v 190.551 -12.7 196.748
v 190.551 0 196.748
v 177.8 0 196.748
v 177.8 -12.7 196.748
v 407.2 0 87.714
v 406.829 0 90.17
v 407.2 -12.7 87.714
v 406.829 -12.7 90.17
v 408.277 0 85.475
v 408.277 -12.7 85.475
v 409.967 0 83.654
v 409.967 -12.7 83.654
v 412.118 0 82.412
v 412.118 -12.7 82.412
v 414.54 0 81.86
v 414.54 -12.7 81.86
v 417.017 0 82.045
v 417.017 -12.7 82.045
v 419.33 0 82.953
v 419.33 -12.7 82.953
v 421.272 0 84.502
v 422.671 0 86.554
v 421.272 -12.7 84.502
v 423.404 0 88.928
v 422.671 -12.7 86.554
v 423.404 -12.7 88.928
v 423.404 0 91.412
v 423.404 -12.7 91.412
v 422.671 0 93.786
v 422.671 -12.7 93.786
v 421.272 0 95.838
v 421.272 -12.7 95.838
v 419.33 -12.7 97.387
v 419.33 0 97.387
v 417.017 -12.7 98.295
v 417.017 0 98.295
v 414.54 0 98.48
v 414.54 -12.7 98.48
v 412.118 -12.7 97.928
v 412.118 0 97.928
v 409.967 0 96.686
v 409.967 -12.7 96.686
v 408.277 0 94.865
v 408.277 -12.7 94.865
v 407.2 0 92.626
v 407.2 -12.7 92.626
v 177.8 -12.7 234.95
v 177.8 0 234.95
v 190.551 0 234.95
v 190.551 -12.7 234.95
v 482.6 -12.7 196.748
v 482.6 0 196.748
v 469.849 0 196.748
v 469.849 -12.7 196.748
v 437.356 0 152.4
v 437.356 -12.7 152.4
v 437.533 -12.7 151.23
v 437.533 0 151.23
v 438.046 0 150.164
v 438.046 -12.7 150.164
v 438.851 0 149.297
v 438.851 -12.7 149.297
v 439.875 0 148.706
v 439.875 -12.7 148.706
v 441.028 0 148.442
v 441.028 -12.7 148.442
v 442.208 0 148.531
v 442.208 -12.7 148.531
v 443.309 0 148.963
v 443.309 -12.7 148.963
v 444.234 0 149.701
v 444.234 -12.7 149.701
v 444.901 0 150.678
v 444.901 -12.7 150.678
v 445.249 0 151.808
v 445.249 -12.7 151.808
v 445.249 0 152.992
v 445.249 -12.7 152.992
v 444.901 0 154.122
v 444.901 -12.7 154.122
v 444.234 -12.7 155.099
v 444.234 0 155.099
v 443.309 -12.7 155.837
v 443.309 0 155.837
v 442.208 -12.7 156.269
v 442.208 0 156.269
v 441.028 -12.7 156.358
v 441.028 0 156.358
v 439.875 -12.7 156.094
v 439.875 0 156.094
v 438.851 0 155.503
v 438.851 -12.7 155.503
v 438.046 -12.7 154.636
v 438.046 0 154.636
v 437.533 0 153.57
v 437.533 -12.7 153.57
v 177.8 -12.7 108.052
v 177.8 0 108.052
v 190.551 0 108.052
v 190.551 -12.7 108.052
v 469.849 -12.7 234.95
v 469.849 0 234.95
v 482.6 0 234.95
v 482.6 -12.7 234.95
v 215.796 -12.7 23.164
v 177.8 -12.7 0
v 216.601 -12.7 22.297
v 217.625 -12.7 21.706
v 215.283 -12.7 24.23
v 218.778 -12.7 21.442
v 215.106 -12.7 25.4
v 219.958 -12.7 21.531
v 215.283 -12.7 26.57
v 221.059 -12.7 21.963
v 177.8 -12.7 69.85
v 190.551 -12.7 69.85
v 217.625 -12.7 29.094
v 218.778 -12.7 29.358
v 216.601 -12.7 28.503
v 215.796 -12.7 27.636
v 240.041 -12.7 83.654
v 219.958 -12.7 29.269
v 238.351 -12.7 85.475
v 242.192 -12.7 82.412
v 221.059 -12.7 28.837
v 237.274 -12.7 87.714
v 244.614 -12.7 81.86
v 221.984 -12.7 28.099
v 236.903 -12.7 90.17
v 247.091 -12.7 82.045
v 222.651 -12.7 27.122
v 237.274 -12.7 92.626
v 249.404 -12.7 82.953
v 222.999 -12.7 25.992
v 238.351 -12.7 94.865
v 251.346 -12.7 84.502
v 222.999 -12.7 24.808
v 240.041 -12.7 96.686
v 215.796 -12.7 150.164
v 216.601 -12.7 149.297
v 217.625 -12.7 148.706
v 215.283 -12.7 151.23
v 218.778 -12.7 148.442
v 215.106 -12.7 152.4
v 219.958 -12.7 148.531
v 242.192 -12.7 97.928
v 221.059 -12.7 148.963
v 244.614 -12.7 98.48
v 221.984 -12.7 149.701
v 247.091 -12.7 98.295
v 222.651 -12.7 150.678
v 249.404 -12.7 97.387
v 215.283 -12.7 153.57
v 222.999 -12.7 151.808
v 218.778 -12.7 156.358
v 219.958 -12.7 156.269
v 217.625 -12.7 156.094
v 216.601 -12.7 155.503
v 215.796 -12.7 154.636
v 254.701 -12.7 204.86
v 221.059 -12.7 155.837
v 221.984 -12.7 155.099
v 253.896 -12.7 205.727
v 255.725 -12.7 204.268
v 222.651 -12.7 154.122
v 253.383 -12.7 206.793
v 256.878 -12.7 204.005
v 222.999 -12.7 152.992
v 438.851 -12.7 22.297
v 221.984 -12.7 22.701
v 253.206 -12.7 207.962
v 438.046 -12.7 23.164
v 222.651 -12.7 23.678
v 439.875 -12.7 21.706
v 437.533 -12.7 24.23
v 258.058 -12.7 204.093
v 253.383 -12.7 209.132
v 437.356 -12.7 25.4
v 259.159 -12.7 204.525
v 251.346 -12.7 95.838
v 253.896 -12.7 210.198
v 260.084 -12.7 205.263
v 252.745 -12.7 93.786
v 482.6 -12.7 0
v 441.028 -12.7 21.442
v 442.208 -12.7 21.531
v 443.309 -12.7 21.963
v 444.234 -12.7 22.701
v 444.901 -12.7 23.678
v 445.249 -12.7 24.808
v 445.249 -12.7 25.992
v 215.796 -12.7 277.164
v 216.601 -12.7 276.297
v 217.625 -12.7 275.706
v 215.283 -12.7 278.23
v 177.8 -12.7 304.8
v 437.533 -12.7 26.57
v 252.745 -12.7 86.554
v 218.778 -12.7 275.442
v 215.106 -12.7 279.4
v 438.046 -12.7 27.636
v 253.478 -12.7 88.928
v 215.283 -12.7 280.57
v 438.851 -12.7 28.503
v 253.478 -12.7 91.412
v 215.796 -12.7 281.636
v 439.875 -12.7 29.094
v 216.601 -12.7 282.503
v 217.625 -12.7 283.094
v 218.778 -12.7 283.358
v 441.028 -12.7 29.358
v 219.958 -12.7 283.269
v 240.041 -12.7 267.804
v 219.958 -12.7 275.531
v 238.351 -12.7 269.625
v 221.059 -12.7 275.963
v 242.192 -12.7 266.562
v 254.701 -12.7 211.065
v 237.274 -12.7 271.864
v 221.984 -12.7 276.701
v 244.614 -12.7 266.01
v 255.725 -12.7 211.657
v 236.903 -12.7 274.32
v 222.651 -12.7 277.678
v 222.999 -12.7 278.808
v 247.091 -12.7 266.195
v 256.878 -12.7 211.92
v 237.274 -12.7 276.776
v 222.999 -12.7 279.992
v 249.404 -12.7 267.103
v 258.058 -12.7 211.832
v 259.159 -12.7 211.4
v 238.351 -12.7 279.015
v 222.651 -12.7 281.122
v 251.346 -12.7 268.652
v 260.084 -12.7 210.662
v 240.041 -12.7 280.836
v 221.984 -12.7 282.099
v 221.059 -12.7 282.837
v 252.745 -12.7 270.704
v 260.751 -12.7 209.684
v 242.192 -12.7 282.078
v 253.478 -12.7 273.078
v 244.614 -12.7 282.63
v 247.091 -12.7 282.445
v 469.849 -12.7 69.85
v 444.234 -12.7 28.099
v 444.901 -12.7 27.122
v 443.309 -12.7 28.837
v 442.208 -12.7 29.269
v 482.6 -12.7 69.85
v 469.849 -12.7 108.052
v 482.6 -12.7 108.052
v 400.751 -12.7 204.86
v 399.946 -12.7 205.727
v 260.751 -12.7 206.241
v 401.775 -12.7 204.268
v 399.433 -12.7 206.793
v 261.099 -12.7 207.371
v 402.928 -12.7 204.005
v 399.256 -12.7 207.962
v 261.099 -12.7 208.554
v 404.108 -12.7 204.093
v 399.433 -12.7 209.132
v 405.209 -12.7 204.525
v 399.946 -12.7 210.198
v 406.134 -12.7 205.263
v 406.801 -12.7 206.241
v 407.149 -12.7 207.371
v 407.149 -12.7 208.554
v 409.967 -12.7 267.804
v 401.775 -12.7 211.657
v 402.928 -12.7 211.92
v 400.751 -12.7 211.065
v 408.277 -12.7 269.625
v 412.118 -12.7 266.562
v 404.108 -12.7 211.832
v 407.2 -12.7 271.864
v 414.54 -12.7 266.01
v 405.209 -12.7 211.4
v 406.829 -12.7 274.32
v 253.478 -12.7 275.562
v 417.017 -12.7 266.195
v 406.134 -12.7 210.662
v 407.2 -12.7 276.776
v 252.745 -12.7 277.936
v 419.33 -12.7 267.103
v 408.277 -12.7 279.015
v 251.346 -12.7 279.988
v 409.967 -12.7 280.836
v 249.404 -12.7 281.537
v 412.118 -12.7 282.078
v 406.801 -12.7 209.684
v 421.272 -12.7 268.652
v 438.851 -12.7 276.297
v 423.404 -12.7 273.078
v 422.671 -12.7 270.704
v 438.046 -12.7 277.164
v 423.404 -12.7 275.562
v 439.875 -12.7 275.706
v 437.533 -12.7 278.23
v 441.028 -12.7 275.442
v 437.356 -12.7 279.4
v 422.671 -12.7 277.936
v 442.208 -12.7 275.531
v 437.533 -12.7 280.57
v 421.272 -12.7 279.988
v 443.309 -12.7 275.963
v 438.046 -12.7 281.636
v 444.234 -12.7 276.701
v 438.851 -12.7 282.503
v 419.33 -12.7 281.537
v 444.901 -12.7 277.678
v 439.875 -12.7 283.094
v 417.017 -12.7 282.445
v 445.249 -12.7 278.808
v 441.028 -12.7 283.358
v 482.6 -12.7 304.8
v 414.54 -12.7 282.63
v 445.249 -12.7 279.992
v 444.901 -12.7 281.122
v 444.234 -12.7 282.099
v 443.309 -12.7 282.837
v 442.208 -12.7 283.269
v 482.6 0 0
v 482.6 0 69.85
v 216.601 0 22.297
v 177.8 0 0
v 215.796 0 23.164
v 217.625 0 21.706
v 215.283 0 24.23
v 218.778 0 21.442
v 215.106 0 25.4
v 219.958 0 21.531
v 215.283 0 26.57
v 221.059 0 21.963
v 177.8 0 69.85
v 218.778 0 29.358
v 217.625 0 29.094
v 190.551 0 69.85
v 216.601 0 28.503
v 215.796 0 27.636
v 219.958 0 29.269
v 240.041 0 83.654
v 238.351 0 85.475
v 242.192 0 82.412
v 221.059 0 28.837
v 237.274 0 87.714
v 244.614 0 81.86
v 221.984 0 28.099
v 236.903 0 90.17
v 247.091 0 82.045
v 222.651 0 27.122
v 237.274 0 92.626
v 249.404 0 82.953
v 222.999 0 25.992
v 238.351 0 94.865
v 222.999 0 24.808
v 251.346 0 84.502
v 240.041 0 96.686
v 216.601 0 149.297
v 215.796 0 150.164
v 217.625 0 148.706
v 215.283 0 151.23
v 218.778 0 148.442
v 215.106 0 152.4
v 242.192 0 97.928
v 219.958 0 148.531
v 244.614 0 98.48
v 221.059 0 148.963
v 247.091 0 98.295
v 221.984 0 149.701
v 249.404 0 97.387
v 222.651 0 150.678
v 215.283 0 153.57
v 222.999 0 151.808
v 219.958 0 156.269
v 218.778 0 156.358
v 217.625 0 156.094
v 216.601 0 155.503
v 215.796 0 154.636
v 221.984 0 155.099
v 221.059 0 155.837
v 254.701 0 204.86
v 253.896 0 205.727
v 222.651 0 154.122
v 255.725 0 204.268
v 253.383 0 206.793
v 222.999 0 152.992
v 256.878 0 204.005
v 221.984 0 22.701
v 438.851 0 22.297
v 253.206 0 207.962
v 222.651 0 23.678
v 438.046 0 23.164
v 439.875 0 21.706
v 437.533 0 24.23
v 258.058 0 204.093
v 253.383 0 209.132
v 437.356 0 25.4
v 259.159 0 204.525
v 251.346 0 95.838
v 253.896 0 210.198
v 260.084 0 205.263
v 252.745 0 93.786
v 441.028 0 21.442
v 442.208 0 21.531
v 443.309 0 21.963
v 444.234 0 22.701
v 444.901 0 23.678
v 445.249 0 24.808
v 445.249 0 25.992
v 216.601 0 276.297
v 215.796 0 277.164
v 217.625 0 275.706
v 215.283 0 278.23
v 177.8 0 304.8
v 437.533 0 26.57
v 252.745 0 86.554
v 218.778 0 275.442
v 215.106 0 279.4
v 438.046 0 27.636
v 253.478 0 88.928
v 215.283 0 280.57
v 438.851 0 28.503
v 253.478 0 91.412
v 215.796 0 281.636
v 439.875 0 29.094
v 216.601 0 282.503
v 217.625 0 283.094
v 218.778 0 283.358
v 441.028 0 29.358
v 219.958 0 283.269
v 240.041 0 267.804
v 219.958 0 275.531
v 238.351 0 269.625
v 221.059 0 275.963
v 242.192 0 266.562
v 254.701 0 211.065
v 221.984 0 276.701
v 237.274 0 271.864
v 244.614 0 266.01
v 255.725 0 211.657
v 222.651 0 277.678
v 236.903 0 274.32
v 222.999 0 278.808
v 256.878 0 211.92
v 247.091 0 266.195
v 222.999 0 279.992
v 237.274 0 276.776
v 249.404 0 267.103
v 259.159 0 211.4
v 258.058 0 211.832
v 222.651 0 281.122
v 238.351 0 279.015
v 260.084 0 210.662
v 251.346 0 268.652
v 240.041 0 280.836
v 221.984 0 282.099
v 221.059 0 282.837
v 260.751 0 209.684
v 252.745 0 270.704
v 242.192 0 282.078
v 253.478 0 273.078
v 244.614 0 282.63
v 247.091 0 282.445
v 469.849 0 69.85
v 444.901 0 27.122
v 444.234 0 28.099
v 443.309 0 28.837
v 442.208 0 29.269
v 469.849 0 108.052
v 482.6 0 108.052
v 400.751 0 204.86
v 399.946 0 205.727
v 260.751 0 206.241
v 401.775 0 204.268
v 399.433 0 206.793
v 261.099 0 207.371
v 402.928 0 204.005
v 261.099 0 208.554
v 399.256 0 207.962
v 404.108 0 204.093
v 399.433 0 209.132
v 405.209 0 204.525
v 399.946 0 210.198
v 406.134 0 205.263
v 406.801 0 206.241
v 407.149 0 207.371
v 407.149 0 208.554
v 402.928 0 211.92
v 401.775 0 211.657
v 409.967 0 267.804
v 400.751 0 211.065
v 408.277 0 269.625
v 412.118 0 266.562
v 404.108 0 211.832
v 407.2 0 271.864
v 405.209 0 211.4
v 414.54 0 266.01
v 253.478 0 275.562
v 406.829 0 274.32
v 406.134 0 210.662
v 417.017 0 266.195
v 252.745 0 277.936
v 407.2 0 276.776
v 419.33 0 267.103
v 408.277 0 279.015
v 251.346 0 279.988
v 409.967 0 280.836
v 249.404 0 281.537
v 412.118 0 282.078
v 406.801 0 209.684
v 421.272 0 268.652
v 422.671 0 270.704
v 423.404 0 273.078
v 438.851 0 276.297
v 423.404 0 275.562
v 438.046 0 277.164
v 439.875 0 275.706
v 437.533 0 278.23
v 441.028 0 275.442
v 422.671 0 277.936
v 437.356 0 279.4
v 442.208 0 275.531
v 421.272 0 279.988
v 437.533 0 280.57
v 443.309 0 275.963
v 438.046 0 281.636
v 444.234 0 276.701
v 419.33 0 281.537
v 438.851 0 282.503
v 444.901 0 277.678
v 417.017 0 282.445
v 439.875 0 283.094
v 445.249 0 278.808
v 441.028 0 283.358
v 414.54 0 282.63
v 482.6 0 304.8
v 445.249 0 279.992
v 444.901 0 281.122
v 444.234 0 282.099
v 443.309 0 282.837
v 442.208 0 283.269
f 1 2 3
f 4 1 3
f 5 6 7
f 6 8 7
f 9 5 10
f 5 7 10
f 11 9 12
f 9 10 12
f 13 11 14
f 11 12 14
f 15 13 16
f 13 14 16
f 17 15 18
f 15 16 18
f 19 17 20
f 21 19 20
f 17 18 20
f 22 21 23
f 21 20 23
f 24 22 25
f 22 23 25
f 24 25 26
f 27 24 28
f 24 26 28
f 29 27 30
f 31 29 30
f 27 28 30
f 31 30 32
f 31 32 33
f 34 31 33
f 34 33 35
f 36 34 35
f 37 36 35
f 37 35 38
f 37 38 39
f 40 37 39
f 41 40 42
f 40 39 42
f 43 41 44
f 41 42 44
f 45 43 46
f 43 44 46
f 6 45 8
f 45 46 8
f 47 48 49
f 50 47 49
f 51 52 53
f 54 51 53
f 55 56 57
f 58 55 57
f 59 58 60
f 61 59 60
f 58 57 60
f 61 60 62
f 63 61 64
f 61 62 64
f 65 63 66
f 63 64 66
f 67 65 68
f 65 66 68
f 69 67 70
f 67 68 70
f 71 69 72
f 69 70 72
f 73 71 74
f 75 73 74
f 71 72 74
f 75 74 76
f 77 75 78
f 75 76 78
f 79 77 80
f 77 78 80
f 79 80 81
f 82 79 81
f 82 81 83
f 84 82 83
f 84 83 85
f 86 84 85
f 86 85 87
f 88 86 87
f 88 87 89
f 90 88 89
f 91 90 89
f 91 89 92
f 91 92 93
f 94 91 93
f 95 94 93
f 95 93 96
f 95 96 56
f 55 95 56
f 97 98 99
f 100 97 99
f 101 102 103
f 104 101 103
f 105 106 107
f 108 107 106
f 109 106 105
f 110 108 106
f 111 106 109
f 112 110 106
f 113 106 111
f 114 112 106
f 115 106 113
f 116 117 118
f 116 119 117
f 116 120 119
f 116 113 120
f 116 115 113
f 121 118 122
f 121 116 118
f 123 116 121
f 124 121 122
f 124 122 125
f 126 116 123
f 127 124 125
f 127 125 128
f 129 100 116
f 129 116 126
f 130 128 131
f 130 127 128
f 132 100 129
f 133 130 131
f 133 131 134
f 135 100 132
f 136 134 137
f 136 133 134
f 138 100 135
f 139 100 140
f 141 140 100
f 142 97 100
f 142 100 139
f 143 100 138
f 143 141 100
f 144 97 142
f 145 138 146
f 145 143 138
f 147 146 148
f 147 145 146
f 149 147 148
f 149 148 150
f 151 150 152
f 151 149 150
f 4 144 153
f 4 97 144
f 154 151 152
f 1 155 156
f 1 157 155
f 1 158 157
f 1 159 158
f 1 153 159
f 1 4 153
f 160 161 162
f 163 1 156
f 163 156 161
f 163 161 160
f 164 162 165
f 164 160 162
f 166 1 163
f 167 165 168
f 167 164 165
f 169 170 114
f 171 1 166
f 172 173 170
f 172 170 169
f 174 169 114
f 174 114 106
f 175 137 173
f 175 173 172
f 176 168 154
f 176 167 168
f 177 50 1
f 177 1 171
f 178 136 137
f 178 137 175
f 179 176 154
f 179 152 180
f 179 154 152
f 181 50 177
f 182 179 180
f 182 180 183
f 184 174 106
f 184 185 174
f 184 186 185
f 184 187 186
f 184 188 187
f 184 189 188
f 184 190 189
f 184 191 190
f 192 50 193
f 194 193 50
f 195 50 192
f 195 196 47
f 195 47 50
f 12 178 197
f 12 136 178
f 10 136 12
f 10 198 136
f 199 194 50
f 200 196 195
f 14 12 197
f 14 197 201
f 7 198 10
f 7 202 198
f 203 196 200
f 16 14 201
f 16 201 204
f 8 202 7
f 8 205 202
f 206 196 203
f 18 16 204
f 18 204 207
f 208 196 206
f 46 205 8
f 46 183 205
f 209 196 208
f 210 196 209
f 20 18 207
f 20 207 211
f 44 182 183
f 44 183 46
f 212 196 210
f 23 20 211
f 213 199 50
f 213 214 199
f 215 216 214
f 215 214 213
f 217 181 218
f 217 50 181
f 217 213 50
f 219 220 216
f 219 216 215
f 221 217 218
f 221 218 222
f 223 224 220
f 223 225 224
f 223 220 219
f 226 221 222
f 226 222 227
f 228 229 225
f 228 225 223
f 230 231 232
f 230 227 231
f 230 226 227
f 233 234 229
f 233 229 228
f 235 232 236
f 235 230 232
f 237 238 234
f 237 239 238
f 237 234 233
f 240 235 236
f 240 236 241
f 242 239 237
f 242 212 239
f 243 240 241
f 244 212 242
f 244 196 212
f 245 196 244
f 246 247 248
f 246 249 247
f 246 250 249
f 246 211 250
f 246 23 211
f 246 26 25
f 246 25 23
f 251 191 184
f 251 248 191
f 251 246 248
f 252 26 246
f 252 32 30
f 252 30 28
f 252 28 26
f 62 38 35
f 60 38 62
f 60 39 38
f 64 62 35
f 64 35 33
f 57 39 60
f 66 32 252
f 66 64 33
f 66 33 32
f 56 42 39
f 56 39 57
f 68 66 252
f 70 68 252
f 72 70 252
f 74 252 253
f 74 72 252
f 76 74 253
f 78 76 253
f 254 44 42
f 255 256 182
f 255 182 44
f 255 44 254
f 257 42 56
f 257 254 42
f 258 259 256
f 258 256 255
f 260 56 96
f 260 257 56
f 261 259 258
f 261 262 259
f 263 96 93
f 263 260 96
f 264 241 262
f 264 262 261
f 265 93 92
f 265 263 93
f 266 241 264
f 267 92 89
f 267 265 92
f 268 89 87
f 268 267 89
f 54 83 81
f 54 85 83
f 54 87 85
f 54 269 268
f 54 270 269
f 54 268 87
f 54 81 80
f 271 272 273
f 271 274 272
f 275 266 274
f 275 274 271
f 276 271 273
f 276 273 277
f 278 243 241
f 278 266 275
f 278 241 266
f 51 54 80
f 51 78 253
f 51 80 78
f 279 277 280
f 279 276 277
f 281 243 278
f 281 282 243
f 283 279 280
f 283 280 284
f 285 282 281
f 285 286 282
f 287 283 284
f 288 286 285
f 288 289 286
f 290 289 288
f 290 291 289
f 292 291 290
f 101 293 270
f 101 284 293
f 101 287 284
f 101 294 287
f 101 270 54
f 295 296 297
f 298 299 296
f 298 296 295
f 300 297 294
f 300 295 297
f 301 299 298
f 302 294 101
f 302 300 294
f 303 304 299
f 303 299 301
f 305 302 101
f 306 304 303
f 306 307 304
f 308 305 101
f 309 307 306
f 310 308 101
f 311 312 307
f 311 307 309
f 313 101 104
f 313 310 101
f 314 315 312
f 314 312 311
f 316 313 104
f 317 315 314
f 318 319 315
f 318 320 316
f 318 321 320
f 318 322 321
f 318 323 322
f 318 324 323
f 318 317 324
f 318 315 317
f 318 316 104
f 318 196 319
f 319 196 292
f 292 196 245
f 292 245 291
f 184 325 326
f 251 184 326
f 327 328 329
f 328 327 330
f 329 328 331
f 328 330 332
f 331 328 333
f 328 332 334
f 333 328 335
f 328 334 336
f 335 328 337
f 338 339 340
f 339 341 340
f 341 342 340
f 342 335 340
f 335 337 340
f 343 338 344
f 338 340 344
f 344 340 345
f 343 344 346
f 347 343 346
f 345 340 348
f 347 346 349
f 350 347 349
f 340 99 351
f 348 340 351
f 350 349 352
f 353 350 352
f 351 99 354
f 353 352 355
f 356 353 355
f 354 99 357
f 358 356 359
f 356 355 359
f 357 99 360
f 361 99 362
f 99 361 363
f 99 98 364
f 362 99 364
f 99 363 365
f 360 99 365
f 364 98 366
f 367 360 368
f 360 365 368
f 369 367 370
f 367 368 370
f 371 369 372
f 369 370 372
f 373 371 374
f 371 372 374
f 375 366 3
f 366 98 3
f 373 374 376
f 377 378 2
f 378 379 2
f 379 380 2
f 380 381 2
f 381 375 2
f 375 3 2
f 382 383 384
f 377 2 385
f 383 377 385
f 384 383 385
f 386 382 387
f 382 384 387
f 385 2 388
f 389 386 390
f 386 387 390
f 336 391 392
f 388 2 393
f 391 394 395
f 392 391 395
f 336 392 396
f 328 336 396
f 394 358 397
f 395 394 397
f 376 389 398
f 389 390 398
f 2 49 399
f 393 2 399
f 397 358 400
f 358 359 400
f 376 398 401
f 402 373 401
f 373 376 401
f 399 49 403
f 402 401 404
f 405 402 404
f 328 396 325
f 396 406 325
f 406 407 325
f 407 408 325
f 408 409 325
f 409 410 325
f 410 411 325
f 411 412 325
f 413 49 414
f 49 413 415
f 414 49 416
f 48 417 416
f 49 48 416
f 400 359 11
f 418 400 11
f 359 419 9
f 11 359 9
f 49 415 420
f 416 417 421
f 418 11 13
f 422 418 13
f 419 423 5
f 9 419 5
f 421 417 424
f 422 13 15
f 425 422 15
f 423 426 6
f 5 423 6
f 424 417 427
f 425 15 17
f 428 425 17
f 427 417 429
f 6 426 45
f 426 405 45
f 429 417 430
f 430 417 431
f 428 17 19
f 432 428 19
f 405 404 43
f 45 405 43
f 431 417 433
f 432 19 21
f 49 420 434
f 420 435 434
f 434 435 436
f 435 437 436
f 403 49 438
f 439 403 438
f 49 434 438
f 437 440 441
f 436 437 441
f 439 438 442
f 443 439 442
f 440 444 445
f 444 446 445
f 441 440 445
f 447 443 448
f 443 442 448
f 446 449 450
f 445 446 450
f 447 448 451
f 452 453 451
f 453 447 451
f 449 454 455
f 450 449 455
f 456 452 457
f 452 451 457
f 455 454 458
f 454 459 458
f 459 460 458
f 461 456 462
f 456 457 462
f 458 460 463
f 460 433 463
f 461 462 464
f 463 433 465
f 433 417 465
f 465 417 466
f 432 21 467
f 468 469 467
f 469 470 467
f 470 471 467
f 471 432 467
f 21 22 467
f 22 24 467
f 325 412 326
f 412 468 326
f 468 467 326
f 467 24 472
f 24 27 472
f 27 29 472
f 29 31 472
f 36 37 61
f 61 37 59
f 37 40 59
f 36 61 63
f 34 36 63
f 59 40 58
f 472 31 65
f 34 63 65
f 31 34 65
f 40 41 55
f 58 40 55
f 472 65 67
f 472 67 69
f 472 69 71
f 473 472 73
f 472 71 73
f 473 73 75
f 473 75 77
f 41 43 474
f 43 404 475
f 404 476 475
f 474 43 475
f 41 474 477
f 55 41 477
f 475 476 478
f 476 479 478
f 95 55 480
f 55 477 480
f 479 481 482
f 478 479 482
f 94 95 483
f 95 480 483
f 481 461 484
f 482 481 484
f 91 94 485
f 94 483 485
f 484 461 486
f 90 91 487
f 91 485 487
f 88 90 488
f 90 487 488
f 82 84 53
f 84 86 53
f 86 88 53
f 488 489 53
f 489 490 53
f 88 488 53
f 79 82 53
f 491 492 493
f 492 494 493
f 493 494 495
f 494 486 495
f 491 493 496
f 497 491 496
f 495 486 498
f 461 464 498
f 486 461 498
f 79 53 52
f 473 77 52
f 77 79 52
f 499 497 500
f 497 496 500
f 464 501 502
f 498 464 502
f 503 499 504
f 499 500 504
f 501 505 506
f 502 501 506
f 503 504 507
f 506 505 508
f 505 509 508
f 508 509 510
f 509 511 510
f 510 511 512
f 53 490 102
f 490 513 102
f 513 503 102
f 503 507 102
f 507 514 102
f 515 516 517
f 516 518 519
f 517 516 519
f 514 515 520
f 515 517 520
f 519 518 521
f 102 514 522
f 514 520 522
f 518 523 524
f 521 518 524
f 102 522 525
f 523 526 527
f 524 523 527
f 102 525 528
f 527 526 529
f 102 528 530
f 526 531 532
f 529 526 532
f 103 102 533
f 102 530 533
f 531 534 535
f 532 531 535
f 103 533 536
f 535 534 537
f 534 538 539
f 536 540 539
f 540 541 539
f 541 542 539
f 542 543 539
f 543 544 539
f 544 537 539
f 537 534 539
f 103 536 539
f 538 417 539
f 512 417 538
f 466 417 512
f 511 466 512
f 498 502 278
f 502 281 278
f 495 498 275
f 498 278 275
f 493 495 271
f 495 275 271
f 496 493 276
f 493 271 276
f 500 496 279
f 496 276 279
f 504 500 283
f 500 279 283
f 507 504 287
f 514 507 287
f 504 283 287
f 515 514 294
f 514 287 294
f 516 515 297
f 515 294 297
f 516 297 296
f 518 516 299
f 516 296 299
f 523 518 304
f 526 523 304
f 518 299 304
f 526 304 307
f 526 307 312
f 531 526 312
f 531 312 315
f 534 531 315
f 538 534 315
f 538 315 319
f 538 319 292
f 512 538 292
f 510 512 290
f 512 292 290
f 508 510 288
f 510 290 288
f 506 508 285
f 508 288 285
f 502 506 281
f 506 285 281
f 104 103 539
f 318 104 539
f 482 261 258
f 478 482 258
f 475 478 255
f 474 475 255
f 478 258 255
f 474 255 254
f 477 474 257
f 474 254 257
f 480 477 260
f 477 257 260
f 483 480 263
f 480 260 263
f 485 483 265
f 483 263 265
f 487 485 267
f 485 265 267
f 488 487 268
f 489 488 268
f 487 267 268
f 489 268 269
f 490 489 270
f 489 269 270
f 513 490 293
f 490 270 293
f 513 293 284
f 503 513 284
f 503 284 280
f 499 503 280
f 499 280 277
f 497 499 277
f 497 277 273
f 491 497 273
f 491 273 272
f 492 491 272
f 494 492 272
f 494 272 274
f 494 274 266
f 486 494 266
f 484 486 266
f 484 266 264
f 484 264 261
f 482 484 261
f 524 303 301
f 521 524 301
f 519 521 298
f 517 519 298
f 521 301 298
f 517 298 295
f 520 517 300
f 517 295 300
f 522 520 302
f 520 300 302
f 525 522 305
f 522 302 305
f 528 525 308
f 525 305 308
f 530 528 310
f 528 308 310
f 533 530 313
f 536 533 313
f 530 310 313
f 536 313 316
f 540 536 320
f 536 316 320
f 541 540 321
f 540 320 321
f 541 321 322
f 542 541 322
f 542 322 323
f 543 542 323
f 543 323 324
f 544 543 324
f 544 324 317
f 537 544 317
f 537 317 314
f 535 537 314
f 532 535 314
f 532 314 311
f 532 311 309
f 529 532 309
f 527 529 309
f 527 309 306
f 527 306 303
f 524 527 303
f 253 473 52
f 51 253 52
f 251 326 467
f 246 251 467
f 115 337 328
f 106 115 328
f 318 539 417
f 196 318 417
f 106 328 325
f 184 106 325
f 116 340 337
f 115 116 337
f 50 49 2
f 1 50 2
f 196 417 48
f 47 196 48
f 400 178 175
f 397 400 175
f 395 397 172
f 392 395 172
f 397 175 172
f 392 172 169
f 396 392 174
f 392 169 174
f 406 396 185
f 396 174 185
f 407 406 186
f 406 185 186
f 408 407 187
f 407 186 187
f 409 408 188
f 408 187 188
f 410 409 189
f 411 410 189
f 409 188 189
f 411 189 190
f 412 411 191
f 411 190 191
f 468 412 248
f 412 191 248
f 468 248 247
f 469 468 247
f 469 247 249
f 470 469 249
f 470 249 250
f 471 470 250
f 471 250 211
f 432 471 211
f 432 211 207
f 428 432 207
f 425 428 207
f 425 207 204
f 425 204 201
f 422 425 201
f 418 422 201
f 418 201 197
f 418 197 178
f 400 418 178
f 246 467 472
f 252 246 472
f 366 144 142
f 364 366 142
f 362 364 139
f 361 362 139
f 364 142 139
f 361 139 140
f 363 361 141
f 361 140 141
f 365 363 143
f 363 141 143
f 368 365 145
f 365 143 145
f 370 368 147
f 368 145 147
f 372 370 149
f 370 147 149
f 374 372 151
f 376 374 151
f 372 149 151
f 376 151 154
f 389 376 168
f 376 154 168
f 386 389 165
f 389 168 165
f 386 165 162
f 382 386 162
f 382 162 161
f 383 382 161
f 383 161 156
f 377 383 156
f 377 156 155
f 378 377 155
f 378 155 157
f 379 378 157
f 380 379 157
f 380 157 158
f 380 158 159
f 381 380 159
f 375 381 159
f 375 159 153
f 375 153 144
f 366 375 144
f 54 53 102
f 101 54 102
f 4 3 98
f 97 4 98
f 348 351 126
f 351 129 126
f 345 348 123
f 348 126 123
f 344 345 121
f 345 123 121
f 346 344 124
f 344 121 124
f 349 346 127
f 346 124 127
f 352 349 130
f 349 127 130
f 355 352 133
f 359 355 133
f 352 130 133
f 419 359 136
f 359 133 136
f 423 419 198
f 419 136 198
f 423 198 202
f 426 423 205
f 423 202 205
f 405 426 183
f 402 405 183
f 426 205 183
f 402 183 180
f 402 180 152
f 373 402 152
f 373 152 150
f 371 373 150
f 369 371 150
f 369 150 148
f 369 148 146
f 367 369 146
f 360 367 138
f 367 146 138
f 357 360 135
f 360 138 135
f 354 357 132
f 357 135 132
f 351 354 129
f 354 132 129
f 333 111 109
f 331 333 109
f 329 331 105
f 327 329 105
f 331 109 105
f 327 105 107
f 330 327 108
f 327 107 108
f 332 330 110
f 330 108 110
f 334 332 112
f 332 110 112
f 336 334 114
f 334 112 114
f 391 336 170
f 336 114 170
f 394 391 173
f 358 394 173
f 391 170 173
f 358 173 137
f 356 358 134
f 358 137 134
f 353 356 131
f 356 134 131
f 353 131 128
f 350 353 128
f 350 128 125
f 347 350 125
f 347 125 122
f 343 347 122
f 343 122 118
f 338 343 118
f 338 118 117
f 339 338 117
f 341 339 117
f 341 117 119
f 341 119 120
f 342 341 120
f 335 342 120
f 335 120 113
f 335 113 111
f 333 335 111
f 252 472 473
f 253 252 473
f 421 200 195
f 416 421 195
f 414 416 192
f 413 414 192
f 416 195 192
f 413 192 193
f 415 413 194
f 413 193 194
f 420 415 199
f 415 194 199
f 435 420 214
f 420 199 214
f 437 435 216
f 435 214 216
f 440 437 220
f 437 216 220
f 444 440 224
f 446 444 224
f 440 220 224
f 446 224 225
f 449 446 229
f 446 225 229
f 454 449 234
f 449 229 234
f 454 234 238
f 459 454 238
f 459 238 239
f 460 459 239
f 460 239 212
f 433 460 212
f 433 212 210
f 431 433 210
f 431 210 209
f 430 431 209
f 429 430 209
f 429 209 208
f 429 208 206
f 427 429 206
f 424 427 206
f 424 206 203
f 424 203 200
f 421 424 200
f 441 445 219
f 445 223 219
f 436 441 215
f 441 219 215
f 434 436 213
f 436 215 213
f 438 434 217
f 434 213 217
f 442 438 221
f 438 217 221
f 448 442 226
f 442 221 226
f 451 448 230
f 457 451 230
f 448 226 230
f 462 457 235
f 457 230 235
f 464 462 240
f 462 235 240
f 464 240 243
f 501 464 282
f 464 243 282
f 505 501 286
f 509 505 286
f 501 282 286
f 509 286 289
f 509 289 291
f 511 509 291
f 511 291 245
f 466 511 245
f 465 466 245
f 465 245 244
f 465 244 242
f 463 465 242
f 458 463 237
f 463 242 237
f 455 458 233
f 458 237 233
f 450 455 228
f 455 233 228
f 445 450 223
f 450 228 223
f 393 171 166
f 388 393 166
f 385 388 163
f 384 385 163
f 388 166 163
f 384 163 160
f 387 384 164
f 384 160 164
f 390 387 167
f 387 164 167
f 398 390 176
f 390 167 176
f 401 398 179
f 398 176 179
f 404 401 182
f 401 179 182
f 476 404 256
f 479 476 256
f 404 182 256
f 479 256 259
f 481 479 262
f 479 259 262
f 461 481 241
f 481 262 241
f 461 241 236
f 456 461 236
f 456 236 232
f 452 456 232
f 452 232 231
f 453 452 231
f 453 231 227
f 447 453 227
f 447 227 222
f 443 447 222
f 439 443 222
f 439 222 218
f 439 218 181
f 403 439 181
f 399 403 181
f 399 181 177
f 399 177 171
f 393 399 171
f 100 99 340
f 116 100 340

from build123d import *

# Parameters (mm, degrees)
F1_DEPTH = 12.7
F2_D     = 16.66748
F2_DEPTH = 12.7
F2_TIP   = 5.0074161752
F3_D     = 7.9375
F3_DEPTH = 17.4625
F3_TIP   = 2.3846655818


with BuildPart() as f1:
    # F0 (on Front) → F1 (new body)
    with BuildSketch(Plane.XZ):
        Polygon((177.8, 0), (482.6, 0), (482.6, 69.85), (469.8492, 69.85), (469.8492, 108.0516), (482.6, 108.0516), (482.6, 196.7484), (469.8492, 196.7484), (469.8492, 234.95), (482.6, 234.95), (482.6, 304.8), (177.8, 304.8), (177.8, 234.95), (190.5508, 234.95), (190.5508, 196.7484), (177.8, 196.7484), (177.8, 108.0516), (190.5508, 108.0516), (190.5508, 69.85), (177.8, 69.85), align=None)
    extrude(amount=F1_DEPTH)

    # F2
    with Locations(Plane(origin=(0, 0, 0), x_dir=(1, 0, 0), z_dir=(0, 1, 0))):
        with Locations((245.237, -274.32), (415.163, -274.32), (415.163, -90.17), (245.237, -90.17)):
            Hole(F2_D / 2, depth=F2_DEPTH)
            with Locations((0, 0, -(F2_DEPTH + F2_TIP / 2))):  # 118° drill point
                Cone(0, F2_D / 2, F2_TIP, mode=Mode.SUBTRACT)

    # F3
    with Locations(Plane(origin=(0, 0, 0), x_dir=(1, 0, 0), z_dir=(0, 1, 0))):
        with Locations((219.075, -279.4), (257.175, -207.9625), (219.075, -152.4), (403.225, -207.9625), (441.325, -279.4), (441.325, -152.4), (441.325, -25.4), (219.075, -25.4)):
            Hole(F3_D / 2, depth=F3_DEPTH)
            with Locations((0, 0, -(F3_DEPTH + F3_TIP / 2))):  # 118° drill point
                Cone(0, F3_D / 2, F3_TIP, mode=Mode.SUBTRACT)


solid = f1.part
